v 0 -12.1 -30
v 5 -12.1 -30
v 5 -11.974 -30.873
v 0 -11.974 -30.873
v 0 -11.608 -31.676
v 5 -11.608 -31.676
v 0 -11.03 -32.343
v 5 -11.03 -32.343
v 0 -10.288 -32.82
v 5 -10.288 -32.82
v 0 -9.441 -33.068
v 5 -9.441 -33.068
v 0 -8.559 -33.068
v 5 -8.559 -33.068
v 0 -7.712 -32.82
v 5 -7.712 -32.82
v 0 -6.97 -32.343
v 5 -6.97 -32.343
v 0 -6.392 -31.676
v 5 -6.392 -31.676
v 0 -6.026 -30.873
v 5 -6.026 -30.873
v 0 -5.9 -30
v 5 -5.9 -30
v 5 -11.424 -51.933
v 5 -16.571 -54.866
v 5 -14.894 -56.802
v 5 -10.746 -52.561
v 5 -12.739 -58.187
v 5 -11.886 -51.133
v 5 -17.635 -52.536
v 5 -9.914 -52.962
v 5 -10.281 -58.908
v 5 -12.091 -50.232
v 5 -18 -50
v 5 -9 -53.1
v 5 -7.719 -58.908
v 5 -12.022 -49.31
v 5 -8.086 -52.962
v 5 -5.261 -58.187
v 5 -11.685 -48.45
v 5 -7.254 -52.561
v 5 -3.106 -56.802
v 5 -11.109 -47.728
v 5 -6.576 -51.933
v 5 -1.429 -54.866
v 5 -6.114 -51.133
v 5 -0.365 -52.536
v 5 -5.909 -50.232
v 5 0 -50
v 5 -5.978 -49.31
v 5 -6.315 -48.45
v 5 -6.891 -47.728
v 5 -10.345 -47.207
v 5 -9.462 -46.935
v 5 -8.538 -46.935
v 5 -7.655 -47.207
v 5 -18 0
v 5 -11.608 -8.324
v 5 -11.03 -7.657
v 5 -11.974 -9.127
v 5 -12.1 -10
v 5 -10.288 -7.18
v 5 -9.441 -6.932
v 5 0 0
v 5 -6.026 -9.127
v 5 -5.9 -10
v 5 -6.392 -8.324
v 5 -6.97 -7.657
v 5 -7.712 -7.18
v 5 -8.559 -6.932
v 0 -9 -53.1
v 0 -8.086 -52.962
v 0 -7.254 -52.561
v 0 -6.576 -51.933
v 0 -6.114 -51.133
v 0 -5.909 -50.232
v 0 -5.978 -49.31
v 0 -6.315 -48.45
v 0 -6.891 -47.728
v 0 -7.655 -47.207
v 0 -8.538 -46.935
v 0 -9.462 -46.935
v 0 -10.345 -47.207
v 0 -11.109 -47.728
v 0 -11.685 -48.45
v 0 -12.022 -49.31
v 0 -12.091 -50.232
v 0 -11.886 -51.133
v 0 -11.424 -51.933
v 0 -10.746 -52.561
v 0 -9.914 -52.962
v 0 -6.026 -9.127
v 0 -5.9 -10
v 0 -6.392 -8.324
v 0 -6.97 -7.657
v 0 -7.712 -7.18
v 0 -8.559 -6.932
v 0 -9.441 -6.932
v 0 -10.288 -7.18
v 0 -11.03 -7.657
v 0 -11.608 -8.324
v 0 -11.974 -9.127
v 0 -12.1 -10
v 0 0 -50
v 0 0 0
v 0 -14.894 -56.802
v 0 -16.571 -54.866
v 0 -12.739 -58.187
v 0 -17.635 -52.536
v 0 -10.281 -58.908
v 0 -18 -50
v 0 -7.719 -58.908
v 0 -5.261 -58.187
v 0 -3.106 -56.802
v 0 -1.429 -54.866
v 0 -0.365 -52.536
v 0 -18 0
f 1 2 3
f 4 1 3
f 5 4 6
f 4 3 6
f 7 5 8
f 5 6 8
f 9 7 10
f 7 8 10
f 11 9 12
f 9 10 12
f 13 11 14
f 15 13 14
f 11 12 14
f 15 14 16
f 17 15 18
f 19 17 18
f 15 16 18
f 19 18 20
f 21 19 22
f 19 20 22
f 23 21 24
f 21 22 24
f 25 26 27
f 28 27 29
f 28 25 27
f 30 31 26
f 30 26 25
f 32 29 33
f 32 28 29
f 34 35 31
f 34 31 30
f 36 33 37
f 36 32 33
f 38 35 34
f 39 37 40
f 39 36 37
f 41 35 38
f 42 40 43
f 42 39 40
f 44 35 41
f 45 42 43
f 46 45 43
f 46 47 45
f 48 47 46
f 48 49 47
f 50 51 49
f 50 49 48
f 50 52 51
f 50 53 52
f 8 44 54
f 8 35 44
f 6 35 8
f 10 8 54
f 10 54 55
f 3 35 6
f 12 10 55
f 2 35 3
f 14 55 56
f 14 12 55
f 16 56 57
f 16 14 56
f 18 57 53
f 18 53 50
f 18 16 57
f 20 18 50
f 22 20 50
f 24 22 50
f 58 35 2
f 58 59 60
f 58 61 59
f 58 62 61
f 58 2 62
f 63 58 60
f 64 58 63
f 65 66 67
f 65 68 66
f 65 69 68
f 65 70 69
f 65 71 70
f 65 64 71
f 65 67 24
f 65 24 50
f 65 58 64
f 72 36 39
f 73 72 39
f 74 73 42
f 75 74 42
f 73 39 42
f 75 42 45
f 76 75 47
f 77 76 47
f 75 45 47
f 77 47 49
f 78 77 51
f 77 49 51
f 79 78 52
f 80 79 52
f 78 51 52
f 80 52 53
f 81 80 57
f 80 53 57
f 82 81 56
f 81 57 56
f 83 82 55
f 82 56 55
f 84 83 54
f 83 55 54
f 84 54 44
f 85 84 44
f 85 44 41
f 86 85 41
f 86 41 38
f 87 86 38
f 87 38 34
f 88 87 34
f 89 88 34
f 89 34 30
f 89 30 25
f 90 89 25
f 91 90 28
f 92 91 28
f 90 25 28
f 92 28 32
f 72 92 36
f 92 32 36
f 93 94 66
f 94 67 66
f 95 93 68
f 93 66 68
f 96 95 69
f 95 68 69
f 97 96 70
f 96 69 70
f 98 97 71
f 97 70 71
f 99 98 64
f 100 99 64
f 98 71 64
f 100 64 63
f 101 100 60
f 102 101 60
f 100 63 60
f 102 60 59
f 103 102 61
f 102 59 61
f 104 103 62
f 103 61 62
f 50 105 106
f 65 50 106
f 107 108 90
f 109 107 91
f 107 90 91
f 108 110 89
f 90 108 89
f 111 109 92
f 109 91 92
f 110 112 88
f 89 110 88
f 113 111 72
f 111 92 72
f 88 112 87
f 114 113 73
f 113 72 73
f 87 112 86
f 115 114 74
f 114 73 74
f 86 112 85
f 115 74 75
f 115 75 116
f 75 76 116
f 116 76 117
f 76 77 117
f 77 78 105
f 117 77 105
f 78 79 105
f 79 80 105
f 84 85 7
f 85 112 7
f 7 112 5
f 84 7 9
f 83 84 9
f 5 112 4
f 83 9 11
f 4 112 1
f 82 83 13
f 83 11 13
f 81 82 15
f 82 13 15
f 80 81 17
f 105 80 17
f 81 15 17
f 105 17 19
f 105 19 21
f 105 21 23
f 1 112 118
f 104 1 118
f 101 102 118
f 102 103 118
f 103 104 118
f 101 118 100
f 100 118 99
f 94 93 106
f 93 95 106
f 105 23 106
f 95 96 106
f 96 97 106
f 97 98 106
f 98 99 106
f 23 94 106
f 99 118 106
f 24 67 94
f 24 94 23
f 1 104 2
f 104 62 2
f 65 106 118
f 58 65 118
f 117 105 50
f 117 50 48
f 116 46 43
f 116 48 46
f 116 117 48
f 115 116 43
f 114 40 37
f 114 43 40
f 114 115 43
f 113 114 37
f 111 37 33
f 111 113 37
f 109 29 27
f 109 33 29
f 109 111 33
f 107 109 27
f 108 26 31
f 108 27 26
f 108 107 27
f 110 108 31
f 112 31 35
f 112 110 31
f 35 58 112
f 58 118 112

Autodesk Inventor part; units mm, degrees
ref_plane "YZ Plane" through (0, 0, 0) normal (1, 0, 0) x (0, 1, 0)
ref_plane "XZ Plane" through (0, 0, 0) normal (0, 1, 0) x (-1, 0, 0)
ref_plane "XY Plane" through (0, 0, 0) normal (0, 0, 1) x (1, 0, 0)
sketch "Sketch1" plane through (0, 0, 0) normal (1, 0, 0) x (0, 1, 0)
  point P0 (0, 0)
sketch "Sketch2" plane through (0, 0, 0) normal (1, 0, 0) x (0, 1, 0)
  line L0 (0, 0) -> (-18, 0)
  line L1 (-18, 0) -> (-18, -50)
  line L2 (0, -50) -> (0, 0)
  arc A0 (-18, -50) -> (0, -50) centre (-9, -50) ccw
  point P0 (-4.8185, -57.9696)
  dimension "d0" = 18
  dimension "d1" = 50
  dimension "d4" = 18
extrude "Extrusion1" add sketch "Sketch2" along normal blind 5
sketch "Sketch3" plane through (5, 0, 0) normal (1, 0, 0) x (0, 0, -1)
  arc A0 (50, -18) -> (50, 0) centre (50, -9) ccw projected
  circle A1 centre (50, -9) radius 3.1
  arc A2 (10, -5.9) -> (10, -12.1) centre (10, -9) ccw
  arc A3 (30, -12.1) -> (30, -5.9) centre (30, -9) ccw
  line L0 (10, -5.9) -> (30, -5.9)
  line L1 (10, -12.1) -> (30, -12.1)
  line L2 (0, 0) -> (0, -18) projected
  dimension "d5" = 6.2
  dimension "d6" = 6.2
  dimension "d7" = 6.2
  dimension "d8" = 10
  dimension "d9" = 20
extrude "Extrusion2" cut sketch "Sketch3" against normal through all
properties part number "roller bracket"
